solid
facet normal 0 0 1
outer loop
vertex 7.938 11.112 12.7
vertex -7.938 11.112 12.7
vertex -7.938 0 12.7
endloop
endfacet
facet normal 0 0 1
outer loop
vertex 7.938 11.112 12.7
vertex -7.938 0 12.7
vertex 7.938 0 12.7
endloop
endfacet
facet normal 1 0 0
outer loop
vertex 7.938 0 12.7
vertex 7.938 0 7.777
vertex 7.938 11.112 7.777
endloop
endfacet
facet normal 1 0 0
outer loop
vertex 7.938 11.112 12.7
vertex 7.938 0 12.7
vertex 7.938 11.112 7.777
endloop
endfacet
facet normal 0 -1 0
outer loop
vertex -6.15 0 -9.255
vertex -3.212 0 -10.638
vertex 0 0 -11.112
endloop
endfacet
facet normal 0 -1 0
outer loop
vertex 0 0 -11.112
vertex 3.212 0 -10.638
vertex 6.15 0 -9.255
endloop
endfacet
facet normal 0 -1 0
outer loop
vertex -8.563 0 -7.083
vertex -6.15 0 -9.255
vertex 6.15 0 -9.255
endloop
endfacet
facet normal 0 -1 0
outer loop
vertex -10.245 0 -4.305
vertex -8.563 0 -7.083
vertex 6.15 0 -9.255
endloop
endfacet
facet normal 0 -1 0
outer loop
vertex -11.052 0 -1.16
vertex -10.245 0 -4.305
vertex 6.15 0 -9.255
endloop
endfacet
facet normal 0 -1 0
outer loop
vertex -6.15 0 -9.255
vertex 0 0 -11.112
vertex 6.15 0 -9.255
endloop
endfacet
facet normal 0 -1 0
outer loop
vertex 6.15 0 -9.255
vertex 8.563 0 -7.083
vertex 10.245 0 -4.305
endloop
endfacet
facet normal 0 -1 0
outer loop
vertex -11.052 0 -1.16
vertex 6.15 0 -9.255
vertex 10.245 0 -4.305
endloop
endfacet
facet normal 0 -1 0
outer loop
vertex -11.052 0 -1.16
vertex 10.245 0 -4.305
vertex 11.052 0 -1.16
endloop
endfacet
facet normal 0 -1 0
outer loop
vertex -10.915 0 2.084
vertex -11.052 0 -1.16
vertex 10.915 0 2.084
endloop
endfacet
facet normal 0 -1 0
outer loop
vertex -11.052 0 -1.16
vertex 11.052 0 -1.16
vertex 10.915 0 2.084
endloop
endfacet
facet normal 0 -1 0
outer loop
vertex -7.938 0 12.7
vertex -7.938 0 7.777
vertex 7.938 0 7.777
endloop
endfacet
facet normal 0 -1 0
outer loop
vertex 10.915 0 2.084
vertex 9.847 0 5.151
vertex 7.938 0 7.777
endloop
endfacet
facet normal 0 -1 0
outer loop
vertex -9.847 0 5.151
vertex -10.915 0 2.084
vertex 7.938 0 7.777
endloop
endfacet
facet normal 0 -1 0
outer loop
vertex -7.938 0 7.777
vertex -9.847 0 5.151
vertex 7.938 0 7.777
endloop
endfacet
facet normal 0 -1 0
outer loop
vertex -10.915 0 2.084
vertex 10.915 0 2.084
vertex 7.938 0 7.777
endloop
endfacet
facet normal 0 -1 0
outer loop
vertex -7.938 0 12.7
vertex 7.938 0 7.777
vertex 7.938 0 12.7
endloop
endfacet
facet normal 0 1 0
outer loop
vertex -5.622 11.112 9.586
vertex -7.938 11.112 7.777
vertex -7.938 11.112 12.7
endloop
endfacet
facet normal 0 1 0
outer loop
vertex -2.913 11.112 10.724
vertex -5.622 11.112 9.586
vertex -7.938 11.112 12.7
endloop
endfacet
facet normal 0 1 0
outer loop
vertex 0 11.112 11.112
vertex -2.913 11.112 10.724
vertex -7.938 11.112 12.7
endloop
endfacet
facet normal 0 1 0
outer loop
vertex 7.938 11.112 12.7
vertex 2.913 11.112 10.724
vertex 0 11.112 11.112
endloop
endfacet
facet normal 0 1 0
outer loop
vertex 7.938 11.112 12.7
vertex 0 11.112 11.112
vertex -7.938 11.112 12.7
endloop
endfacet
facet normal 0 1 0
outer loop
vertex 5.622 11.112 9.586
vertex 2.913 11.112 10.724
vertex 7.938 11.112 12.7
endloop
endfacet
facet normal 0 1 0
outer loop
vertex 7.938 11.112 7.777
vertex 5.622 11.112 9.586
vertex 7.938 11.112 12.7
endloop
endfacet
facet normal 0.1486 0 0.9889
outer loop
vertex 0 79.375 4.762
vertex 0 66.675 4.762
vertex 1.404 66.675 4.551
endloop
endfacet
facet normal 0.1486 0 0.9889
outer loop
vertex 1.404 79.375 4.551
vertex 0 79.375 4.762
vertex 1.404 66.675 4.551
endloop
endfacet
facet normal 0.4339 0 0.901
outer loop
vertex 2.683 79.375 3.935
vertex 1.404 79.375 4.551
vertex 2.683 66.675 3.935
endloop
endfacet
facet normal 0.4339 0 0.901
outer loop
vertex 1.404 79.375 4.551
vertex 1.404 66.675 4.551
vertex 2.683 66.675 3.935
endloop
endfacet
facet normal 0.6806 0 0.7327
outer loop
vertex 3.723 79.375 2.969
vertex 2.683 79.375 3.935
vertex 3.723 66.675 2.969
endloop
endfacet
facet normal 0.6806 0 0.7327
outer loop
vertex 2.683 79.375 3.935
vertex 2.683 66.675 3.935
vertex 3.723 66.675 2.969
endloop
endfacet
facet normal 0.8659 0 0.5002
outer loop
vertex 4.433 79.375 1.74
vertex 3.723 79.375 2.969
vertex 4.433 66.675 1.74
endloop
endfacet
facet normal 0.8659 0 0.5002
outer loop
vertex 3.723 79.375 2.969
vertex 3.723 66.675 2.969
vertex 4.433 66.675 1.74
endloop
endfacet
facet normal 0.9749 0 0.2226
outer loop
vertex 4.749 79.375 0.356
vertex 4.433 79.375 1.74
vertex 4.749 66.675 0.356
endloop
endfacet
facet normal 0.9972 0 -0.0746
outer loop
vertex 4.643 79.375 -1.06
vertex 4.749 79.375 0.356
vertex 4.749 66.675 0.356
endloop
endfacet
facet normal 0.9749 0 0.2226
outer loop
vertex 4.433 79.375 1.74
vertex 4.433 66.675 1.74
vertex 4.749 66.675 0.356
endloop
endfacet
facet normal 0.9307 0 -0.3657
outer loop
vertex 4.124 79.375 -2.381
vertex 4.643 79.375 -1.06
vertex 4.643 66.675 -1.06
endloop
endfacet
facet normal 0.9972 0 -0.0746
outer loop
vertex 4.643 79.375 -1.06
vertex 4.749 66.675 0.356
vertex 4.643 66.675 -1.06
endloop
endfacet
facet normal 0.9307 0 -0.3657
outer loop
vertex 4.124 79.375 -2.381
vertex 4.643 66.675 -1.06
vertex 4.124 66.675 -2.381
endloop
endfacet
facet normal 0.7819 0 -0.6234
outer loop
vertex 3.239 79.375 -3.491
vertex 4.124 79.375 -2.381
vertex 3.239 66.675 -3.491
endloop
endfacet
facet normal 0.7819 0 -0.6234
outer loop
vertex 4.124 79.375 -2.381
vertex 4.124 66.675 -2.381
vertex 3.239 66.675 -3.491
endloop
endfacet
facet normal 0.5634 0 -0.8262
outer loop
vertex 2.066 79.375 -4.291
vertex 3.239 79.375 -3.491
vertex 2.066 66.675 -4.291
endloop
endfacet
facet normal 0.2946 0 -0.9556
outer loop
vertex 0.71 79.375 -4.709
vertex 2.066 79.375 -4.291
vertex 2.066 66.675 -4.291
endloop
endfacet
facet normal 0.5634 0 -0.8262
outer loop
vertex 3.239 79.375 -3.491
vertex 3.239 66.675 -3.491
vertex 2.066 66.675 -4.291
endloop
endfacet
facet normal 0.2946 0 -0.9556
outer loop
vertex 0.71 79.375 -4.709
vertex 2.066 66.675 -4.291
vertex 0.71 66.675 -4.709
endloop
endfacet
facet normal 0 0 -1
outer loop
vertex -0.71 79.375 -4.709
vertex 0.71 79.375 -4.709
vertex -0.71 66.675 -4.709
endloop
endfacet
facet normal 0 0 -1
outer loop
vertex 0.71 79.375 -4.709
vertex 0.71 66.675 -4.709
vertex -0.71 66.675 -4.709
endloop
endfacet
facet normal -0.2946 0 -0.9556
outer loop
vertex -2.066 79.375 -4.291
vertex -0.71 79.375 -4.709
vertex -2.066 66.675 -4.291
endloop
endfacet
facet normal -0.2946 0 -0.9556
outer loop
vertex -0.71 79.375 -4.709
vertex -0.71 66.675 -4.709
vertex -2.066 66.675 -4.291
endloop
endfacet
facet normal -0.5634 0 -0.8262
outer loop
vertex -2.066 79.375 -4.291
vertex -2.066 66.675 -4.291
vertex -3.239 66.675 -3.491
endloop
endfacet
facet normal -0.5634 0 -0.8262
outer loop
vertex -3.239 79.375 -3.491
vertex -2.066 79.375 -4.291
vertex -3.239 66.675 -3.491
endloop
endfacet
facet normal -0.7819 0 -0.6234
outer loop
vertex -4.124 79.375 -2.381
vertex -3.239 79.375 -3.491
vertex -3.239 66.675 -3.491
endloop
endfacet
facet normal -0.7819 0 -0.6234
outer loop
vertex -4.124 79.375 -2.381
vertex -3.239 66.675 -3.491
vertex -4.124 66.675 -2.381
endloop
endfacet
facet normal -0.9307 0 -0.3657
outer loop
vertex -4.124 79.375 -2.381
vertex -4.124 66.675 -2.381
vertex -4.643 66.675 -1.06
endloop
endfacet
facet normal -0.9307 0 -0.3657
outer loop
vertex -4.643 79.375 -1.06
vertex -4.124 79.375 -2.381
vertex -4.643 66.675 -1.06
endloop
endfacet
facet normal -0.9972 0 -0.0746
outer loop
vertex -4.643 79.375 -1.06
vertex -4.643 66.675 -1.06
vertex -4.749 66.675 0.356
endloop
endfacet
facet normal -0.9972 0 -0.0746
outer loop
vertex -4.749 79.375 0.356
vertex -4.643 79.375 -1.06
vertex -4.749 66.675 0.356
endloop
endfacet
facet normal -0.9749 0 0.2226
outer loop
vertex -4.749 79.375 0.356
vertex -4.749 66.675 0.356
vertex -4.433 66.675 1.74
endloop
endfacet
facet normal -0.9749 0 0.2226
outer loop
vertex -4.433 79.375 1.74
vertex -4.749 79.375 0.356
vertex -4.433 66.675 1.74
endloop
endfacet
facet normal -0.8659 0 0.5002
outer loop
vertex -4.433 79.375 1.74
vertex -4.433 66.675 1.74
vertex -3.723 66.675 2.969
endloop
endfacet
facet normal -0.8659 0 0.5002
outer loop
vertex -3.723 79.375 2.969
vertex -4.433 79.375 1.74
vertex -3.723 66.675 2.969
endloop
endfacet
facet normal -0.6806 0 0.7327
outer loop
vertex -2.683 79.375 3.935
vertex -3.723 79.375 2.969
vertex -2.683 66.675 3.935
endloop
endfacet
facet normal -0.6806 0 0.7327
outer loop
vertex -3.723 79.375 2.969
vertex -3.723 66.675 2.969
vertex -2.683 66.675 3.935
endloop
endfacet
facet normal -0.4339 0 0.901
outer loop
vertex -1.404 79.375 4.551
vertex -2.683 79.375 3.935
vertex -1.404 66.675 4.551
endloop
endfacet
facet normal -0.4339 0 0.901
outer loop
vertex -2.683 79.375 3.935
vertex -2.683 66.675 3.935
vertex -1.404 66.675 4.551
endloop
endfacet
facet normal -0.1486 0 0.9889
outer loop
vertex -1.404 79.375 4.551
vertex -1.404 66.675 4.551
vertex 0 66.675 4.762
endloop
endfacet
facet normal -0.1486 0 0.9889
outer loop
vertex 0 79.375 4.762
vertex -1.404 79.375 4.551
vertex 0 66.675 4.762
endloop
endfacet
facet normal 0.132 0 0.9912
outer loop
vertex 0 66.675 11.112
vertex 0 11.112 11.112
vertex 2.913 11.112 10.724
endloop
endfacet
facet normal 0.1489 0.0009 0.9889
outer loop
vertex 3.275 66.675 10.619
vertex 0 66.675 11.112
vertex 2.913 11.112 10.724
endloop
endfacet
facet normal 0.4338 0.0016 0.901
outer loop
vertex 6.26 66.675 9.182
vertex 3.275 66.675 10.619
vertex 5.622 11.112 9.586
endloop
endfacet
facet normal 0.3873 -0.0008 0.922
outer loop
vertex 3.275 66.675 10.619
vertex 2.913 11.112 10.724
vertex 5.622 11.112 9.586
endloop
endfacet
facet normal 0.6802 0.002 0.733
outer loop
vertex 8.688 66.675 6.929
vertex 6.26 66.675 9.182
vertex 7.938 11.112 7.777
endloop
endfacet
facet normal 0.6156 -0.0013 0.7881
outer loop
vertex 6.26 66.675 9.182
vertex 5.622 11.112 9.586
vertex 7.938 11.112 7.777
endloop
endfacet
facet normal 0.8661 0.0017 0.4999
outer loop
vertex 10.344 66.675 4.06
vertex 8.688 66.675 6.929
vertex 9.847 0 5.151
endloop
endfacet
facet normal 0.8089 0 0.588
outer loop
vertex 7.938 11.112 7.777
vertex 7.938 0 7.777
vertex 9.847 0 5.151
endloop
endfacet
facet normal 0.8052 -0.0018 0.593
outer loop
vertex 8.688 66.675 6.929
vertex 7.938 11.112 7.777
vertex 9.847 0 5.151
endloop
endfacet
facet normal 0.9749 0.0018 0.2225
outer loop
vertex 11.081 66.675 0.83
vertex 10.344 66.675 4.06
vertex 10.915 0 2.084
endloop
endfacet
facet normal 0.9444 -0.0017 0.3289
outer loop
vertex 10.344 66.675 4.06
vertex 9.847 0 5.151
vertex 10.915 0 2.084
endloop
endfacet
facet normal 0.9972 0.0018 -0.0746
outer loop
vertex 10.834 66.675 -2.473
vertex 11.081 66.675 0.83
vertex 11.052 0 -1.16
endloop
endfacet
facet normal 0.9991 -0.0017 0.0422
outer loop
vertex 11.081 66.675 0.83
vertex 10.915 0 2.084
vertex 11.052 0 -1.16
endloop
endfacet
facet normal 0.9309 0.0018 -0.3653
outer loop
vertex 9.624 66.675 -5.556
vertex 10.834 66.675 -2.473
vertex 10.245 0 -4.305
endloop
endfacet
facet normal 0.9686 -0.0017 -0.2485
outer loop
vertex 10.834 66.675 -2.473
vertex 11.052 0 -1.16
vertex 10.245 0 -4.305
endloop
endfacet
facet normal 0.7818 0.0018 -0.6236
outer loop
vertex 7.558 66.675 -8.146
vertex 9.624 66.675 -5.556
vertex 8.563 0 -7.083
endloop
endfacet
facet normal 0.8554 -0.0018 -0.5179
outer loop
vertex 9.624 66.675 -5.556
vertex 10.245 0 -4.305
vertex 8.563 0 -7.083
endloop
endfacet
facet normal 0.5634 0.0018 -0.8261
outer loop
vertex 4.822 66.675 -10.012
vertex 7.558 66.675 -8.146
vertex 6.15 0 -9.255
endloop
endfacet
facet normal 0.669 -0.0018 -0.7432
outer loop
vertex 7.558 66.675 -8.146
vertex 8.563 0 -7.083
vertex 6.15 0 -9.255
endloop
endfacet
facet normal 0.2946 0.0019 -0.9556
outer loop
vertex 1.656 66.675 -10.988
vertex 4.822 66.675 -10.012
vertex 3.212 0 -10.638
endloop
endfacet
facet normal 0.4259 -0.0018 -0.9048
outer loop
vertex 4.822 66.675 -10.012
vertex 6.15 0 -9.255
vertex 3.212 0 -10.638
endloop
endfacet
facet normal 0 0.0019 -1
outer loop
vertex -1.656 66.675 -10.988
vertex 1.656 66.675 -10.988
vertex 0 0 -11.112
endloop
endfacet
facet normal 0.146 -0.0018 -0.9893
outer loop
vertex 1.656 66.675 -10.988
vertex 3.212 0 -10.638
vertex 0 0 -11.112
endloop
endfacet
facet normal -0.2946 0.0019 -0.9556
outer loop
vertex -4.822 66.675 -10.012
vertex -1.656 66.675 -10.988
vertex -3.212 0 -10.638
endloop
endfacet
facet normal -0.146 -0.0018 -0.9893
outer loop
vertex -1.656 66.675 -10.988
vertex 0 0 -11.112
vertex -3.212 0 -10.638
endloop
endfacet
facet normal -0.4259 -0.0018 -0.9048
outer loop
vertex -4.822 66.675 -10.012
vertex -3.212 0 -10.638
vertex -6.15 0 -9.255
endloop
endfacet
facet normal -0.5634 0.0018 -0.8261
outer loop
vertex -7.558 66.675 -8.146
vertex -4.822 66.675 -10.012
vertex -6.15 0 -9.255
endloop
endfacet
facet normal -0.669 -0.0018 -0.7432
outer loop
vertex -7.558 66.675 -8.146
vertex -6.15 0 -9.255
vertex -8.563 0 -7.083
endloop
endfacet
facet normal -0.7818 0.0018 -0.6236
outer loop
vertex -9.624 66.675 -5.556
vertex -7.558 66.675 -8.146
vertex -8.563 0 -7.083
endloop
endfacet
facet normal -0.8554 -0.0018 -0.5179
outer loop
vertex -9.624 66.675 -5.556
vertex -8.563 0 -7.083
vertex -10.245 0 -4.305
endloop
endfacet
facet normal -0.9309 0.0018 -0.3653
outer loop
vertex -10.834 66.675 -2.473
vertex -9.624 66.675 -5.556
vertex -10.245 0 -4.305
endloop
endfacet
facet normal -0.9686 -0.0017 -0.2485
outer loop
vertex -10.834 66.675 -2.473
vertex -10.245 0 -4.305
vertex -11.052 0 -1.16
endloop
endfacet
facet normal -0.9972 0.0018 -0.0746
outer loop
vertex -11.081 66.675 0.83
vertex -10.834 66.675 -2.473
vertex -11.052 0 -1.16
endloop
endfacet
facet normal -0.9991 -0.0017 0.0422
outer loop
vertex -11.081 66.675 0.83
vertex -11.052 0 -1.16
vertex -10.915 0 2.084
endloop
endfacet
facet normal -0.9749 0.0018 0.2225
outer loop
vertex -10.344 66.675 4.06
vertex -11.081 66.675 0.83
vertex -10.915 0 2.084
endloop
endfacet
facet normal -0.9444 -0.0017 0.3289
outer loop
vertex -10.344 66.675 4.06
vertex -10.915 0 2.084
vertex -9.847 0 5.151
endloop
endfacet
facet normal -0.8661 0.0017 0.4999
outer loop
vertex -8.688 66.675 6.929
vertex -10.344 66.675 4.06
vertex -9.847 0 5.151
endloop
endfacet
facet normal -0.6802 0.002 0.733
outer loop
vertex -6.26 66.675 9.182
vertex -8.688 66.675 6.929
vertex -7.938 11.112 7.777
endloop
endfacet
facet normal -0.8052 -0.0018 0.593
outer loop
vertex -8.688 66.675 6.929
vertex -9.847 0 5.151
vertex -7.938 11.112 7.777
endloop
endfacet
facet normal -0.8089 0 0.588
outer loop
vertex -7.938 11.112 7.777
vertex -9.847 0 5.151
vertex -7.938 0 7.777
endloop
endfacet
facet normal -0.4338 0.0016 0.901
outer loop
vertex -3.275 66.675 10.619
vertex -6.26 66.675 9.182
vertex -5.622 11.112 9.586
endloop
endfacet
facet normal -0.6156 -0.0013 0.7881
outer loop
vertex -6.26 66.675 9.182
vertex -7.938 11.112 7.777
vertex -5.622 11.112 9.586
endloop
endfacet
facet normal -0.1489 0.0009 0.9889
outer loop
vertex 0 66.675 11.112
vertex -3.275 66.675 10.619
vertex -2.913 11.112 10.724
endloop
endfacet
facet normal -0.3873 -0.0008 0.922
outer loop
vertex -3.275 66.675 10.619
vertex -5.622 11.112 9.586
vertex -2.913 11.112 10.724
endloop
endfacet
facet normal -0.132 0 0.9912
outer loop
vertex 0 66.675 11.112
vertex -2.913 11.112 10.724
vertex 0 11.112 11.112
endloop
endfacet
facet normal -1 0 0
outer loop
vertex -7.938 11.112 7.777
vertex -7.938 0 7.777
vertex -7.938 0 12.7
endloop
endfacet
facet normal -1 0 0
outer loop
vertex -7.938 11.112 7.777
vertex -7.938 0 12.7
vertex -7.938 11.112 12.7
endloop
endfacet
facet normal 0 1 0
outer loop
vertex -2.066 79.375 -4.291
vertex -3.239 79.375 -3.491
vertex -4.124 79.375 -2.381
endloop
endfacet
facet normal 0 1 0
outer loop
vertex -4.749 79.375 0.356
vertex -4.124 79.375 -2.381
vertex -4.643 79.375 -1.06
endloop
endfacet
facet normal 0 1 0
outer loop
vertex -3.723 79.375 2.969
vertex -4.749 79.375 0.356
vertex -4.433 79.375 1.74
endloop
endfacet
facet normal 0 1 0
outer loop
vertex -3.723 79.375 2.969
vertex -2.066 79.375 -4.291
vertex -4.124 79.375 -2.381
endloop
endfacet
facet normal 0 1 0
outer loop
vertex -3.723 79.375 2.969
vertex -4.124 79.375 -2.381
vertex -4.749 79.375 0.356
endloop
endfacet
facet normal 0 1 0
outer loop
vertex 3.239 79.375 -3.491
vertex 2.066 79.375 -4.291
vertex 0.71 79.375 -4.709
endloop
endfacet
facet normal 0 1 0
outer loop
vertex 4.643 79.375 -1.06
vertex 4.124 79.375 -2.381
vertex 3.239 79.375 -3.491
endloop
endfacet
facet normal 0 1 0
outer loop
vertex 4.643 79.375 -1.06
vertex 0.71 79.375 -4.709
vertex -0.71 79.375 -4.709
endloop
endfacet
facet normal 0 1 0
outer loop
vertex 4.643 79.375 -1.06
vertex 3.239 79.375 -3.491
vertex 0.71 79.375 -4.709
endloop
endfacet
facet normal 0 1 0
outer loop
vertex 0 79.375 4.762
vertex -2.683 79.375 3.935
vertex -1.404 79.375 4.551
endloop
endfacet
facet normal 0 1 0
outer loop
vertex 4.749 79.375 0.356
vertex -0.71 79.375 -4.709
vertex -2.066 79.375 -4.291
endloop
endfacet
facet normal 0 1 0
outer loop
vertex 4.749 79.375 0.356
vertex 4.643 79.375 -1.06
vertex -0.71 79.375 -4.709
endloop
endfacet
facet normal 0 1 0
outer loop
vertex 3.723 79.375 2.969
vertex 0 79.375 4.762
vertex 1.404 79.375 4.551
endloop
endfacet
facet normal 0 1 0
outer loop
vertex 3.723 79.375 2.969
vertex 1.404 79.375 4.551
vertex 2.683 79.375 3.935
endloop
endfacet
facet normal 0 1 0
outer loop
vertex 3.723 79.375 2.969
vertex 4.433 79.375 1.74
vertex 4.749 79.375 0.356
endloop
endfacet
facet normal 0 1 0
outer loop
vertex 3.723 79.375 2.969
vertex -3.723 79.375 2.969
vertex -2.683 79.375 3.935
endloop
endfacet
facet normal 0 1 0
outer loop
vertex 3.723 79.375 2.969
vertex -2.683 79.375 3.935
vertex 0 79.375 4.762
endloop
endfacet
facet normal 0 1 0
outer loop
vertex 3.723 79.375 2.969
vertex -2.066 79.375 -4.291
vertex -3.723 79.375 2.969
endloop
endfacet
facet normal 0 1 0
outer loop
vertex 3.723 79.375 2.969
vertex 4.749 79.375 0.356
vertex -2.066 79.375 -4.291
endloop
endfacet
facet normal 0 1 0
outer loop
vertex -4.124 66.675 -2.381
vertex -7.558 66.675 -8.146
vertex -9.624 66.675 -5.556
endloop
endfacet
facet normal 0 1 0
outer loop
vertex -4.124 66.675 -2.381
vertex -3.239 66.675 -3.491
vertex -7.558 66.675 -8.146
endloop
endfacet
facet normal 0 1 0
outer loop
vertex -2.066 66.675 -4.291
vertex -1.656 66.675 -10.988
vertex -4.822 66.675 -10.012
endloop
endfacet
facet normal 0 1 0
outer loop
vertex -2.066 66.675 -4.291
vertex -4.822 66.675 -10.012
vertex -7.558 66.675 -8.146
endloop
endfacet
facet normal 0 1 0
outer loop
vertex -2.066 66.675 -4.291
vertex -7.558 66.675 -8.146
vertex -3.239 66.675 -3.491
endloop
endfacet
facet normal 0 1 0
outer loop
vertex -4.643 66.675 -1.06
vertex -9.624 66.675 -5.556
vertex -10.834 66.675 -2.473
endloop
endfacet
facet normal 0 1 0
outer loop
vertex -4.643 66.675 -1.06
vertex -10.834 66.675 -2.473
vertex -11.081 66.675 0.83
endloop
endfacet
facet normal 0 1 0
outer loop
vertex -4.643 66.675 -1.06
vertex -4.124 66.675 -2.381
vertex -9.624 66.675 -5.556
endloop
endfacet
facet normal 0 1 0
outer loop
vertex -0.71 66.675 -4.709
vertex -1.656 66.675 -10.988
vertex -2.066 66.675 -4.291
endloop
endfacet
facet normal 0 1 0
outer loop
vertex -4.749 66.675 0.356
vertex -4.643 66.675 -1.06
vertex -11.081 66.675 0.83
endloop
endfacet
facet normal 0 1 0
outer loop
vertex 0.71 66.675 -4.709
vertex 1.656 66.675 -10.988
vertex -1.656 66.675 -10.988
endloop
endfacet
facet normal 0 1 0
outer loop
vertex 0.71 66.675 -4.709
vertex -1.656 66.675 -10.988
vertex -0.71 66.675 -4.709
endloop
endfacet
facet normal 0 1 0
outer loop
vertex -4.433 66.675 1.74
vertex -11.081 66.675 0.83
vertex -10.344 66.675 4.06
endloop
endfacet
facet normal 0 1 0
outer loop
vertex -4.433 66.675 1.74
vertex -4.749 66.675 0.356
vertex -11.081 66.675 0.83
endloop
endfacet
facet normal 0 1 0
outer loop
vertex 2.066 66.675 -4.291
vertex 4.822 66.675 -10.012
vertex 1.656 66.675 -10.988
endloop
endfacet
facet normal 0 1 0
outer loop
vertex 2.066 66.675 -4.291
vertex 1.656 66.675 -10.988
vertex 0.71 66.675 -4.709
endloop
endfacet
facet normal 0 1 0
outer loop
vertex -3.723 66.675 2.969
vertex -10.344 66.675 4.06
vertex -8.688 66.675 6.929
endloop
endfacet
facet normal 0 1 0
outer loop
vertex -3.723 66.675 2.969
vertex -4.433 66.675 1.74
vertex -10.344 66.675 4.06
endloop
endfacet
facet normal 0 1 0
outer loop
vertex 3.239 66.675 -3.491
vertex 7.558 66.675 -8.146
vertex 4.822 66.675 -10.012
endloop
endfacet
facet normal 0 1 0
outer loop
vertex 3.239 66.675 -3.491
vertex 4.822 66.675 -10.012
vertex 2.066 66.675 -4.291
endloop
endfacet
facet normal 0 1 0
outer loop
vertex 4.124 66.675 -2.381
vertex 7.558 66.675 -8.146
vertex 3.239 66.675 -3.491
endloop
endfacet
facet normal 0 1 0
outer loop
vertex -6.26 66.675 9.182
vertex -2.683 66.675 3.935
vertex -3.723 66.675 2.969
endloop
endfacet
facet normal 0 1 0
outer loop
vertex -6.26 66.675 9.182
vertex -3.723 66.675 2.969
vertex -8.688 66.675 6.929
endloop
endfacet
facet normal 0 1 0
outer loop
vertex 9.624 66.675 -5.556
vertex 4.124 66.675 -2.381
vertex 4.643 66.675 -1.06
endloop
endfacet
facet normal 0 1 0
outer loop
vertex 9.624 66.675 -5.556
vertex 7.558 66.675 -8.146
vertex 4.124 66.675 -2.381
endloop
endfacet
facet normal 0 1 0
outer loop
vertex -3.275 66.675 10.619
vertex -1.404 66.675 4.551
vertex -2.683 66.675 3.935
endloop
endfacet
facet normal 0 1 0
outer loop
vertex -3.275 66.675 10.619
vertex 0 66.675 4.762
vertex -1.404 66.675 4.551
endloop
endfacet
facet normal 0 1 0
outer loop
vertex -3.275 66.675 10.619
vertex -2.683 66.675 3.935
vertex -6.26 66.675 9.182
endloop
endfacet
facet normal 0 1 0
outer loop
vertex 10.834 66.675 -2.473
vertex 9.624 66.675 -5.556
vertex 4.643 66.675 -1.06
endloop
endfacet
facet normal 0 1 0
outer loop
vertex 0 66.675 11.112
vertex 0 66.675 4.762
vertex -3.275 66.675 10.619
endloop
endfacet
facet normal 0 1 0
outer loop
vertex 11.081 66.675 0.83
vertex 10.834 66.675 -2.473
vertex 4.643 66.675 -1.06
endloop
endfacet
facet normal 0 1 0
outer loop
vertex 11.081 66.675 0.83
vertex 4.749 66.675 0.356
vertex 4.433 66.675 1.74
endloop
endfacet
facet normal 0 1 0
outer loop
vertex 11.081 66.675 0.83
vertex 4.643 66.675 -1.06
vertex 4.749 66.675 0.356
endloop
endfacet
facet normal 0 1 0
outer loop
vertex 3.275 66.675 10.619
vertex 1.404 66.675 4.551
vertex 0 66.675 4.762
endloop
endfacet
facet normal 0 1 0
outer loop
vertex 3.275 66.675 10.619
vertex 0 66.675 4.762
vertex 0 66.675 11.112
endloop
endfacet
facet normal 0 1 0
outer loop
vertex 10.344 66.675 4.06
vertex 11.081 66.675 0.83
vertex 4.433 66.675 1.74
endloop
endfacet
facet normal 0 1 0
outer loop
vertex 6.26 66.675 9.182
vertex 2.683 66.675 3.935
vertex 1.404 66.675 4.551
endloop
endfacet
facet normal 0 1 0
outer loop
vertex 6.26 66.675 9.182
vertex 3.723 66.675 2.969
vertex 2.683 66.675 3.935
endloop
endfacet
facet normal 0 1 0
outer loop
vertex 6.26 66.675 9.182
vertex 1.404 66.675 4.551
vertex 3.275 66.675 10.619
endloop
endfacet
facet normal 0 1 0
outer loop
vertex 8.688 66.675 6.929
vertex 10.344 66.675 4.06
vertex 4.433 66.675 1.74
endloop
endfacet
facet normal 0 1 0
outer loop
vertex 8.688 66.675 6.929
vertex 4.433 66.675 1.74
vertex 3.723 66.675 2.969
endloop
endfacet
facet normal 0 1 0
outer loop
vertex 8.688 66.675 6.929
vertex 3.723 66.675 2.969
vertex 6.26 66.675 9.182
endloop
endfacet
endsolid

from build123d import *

# Parameters (mm, degrees)
SKETCH1_R           = 11.1125
BOSS_EXTRUDE1_DEPTH = 66.675
SKETCH2_W           = 15.875
SKETCH2_H           = 11.1125
BOSS_EXTRUDE2_DEPTH = 12.7
SKETCH3_R           = 4.7625
BOSS_EXTRUDE3_DEPTH = 12.7


with BuildPart() as part:
    # Sketch1 → Boss-Extrude1 (new body)
    with BuildSketch(Plane(origin=(0, 0, 0), x_dir=(1, 0, 0), z_dir=(0, 1, 0))):
        Circle(SKETCH1_R)
    extrude(amount=BOSS_EXTRUDE1_DEPTH)

    # Sketch2 → Boss-Extrude2 (add)
    with BuildSketch(Plane.XY):
        with Locations((0, 5.55625)):
            Rectangle(SKETCH2_W, SKETCH2_H)
    extrude(amount=BOSS_EXTRUDE2_DEPTH)

    # Sketch3 → Boss-Extrude3 (add)
    with BuildSketch(Plane(origin=(0, 66.675, 0), x_dir=(1, 0, 0), z_dir=(0, 1, 0))):
        Circle(SKETCH3_R)
    extrude(amount=BOSS_EXTRUDE3_DEPTH)


solid = part.part
